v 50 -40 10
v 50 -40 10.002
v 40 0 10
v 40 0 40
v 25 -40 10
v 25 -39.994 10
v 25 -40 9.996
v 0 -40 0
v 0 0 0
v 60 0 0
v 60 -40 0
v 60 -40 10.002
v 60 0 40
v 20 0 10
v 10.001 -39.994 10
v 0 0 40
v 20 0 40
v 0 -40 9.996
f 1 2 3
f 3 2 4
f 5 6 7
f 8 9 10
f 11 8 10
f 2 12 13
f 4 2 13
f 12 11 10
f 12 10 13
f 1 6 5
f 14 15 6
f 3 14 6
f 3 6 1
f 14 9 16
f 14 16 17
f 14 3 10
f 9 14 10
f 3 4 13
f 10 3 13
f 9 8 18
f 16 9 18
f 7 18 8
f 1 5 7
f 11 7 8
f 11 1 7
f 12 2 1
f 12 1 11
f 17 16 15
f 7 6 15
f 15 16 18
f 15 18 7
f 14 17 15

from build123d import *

# Parameters (mm, degrees)
F0_W      = 60
F0_H      = 40
F1_DEPTH  = 40
F3_DEPTH  = 30
F6_DEPTH  = 25
F4_W      = 10
F4_H      = 30
F7_DEPTH  = 25
F10_DEPTH = 25
F8_W      = 10
F8_H      = 30
F11_DEPTH = 25


with BuildPart() as f1:
    # F0 (on Front) → F1 (new body)
    with BuildSketch(Plane.XZ):
        with Locations((30, 20)):
            Rectangle(F0_W, F0_H)
    extrude(amount=F1_DEPTH)

    # F2 (on face) → F3 (cut)
    with BuildSketch(Plane.XY.offset(40)):
        Polygon((40, 0), (20, 0), (10, -40), (50, -40), align=None)
    extrude(amount=-F3_DEPTH, mode=Mode.SUBTRACT)

    # F5 (on face) → F6 (cut)
    with BuildSketch(Plane(origin=(0, 0, 0), x_dir=(0, -1, 0), z_dir=(-1, 0, 0))):
        Polygon((40, 40), (0, 40), (40, 9.9955964833), align=None)
    extrude(amount=-F6_DEPTH, mode=Mode.SUBTRACT)

    # F4 (on face) → F7 (cut)
    with BuildSketch(Plane.XZ.offset(40)):
        with Locations((5, 25)):
            Rectangle(F4_W, F4_H)
    extrude(amount=F7_DEPTH, mode=Mode.SUBTRACT)

    # F9 (on face) → F10 (cut)
    with BuildSketch(Plane.YZ.offset(60)):
        Polygon((-40, 10.0021371618), (0, 40), (-40, 40), align=None)
    extrude(amount=-F10_DEPTH, mode=Mode.SUBTRACT)

    # F8 (on face) → F11 (cut)
    with BuildSketch(Plane.XZ.offset(40)):
        with Locations((55, 25)):
            Rectangle(F8_W, F8_H)
    extrude(amount=F11_DEPTH, mode=Mode.SUBTRACT)


solid = f1.part
